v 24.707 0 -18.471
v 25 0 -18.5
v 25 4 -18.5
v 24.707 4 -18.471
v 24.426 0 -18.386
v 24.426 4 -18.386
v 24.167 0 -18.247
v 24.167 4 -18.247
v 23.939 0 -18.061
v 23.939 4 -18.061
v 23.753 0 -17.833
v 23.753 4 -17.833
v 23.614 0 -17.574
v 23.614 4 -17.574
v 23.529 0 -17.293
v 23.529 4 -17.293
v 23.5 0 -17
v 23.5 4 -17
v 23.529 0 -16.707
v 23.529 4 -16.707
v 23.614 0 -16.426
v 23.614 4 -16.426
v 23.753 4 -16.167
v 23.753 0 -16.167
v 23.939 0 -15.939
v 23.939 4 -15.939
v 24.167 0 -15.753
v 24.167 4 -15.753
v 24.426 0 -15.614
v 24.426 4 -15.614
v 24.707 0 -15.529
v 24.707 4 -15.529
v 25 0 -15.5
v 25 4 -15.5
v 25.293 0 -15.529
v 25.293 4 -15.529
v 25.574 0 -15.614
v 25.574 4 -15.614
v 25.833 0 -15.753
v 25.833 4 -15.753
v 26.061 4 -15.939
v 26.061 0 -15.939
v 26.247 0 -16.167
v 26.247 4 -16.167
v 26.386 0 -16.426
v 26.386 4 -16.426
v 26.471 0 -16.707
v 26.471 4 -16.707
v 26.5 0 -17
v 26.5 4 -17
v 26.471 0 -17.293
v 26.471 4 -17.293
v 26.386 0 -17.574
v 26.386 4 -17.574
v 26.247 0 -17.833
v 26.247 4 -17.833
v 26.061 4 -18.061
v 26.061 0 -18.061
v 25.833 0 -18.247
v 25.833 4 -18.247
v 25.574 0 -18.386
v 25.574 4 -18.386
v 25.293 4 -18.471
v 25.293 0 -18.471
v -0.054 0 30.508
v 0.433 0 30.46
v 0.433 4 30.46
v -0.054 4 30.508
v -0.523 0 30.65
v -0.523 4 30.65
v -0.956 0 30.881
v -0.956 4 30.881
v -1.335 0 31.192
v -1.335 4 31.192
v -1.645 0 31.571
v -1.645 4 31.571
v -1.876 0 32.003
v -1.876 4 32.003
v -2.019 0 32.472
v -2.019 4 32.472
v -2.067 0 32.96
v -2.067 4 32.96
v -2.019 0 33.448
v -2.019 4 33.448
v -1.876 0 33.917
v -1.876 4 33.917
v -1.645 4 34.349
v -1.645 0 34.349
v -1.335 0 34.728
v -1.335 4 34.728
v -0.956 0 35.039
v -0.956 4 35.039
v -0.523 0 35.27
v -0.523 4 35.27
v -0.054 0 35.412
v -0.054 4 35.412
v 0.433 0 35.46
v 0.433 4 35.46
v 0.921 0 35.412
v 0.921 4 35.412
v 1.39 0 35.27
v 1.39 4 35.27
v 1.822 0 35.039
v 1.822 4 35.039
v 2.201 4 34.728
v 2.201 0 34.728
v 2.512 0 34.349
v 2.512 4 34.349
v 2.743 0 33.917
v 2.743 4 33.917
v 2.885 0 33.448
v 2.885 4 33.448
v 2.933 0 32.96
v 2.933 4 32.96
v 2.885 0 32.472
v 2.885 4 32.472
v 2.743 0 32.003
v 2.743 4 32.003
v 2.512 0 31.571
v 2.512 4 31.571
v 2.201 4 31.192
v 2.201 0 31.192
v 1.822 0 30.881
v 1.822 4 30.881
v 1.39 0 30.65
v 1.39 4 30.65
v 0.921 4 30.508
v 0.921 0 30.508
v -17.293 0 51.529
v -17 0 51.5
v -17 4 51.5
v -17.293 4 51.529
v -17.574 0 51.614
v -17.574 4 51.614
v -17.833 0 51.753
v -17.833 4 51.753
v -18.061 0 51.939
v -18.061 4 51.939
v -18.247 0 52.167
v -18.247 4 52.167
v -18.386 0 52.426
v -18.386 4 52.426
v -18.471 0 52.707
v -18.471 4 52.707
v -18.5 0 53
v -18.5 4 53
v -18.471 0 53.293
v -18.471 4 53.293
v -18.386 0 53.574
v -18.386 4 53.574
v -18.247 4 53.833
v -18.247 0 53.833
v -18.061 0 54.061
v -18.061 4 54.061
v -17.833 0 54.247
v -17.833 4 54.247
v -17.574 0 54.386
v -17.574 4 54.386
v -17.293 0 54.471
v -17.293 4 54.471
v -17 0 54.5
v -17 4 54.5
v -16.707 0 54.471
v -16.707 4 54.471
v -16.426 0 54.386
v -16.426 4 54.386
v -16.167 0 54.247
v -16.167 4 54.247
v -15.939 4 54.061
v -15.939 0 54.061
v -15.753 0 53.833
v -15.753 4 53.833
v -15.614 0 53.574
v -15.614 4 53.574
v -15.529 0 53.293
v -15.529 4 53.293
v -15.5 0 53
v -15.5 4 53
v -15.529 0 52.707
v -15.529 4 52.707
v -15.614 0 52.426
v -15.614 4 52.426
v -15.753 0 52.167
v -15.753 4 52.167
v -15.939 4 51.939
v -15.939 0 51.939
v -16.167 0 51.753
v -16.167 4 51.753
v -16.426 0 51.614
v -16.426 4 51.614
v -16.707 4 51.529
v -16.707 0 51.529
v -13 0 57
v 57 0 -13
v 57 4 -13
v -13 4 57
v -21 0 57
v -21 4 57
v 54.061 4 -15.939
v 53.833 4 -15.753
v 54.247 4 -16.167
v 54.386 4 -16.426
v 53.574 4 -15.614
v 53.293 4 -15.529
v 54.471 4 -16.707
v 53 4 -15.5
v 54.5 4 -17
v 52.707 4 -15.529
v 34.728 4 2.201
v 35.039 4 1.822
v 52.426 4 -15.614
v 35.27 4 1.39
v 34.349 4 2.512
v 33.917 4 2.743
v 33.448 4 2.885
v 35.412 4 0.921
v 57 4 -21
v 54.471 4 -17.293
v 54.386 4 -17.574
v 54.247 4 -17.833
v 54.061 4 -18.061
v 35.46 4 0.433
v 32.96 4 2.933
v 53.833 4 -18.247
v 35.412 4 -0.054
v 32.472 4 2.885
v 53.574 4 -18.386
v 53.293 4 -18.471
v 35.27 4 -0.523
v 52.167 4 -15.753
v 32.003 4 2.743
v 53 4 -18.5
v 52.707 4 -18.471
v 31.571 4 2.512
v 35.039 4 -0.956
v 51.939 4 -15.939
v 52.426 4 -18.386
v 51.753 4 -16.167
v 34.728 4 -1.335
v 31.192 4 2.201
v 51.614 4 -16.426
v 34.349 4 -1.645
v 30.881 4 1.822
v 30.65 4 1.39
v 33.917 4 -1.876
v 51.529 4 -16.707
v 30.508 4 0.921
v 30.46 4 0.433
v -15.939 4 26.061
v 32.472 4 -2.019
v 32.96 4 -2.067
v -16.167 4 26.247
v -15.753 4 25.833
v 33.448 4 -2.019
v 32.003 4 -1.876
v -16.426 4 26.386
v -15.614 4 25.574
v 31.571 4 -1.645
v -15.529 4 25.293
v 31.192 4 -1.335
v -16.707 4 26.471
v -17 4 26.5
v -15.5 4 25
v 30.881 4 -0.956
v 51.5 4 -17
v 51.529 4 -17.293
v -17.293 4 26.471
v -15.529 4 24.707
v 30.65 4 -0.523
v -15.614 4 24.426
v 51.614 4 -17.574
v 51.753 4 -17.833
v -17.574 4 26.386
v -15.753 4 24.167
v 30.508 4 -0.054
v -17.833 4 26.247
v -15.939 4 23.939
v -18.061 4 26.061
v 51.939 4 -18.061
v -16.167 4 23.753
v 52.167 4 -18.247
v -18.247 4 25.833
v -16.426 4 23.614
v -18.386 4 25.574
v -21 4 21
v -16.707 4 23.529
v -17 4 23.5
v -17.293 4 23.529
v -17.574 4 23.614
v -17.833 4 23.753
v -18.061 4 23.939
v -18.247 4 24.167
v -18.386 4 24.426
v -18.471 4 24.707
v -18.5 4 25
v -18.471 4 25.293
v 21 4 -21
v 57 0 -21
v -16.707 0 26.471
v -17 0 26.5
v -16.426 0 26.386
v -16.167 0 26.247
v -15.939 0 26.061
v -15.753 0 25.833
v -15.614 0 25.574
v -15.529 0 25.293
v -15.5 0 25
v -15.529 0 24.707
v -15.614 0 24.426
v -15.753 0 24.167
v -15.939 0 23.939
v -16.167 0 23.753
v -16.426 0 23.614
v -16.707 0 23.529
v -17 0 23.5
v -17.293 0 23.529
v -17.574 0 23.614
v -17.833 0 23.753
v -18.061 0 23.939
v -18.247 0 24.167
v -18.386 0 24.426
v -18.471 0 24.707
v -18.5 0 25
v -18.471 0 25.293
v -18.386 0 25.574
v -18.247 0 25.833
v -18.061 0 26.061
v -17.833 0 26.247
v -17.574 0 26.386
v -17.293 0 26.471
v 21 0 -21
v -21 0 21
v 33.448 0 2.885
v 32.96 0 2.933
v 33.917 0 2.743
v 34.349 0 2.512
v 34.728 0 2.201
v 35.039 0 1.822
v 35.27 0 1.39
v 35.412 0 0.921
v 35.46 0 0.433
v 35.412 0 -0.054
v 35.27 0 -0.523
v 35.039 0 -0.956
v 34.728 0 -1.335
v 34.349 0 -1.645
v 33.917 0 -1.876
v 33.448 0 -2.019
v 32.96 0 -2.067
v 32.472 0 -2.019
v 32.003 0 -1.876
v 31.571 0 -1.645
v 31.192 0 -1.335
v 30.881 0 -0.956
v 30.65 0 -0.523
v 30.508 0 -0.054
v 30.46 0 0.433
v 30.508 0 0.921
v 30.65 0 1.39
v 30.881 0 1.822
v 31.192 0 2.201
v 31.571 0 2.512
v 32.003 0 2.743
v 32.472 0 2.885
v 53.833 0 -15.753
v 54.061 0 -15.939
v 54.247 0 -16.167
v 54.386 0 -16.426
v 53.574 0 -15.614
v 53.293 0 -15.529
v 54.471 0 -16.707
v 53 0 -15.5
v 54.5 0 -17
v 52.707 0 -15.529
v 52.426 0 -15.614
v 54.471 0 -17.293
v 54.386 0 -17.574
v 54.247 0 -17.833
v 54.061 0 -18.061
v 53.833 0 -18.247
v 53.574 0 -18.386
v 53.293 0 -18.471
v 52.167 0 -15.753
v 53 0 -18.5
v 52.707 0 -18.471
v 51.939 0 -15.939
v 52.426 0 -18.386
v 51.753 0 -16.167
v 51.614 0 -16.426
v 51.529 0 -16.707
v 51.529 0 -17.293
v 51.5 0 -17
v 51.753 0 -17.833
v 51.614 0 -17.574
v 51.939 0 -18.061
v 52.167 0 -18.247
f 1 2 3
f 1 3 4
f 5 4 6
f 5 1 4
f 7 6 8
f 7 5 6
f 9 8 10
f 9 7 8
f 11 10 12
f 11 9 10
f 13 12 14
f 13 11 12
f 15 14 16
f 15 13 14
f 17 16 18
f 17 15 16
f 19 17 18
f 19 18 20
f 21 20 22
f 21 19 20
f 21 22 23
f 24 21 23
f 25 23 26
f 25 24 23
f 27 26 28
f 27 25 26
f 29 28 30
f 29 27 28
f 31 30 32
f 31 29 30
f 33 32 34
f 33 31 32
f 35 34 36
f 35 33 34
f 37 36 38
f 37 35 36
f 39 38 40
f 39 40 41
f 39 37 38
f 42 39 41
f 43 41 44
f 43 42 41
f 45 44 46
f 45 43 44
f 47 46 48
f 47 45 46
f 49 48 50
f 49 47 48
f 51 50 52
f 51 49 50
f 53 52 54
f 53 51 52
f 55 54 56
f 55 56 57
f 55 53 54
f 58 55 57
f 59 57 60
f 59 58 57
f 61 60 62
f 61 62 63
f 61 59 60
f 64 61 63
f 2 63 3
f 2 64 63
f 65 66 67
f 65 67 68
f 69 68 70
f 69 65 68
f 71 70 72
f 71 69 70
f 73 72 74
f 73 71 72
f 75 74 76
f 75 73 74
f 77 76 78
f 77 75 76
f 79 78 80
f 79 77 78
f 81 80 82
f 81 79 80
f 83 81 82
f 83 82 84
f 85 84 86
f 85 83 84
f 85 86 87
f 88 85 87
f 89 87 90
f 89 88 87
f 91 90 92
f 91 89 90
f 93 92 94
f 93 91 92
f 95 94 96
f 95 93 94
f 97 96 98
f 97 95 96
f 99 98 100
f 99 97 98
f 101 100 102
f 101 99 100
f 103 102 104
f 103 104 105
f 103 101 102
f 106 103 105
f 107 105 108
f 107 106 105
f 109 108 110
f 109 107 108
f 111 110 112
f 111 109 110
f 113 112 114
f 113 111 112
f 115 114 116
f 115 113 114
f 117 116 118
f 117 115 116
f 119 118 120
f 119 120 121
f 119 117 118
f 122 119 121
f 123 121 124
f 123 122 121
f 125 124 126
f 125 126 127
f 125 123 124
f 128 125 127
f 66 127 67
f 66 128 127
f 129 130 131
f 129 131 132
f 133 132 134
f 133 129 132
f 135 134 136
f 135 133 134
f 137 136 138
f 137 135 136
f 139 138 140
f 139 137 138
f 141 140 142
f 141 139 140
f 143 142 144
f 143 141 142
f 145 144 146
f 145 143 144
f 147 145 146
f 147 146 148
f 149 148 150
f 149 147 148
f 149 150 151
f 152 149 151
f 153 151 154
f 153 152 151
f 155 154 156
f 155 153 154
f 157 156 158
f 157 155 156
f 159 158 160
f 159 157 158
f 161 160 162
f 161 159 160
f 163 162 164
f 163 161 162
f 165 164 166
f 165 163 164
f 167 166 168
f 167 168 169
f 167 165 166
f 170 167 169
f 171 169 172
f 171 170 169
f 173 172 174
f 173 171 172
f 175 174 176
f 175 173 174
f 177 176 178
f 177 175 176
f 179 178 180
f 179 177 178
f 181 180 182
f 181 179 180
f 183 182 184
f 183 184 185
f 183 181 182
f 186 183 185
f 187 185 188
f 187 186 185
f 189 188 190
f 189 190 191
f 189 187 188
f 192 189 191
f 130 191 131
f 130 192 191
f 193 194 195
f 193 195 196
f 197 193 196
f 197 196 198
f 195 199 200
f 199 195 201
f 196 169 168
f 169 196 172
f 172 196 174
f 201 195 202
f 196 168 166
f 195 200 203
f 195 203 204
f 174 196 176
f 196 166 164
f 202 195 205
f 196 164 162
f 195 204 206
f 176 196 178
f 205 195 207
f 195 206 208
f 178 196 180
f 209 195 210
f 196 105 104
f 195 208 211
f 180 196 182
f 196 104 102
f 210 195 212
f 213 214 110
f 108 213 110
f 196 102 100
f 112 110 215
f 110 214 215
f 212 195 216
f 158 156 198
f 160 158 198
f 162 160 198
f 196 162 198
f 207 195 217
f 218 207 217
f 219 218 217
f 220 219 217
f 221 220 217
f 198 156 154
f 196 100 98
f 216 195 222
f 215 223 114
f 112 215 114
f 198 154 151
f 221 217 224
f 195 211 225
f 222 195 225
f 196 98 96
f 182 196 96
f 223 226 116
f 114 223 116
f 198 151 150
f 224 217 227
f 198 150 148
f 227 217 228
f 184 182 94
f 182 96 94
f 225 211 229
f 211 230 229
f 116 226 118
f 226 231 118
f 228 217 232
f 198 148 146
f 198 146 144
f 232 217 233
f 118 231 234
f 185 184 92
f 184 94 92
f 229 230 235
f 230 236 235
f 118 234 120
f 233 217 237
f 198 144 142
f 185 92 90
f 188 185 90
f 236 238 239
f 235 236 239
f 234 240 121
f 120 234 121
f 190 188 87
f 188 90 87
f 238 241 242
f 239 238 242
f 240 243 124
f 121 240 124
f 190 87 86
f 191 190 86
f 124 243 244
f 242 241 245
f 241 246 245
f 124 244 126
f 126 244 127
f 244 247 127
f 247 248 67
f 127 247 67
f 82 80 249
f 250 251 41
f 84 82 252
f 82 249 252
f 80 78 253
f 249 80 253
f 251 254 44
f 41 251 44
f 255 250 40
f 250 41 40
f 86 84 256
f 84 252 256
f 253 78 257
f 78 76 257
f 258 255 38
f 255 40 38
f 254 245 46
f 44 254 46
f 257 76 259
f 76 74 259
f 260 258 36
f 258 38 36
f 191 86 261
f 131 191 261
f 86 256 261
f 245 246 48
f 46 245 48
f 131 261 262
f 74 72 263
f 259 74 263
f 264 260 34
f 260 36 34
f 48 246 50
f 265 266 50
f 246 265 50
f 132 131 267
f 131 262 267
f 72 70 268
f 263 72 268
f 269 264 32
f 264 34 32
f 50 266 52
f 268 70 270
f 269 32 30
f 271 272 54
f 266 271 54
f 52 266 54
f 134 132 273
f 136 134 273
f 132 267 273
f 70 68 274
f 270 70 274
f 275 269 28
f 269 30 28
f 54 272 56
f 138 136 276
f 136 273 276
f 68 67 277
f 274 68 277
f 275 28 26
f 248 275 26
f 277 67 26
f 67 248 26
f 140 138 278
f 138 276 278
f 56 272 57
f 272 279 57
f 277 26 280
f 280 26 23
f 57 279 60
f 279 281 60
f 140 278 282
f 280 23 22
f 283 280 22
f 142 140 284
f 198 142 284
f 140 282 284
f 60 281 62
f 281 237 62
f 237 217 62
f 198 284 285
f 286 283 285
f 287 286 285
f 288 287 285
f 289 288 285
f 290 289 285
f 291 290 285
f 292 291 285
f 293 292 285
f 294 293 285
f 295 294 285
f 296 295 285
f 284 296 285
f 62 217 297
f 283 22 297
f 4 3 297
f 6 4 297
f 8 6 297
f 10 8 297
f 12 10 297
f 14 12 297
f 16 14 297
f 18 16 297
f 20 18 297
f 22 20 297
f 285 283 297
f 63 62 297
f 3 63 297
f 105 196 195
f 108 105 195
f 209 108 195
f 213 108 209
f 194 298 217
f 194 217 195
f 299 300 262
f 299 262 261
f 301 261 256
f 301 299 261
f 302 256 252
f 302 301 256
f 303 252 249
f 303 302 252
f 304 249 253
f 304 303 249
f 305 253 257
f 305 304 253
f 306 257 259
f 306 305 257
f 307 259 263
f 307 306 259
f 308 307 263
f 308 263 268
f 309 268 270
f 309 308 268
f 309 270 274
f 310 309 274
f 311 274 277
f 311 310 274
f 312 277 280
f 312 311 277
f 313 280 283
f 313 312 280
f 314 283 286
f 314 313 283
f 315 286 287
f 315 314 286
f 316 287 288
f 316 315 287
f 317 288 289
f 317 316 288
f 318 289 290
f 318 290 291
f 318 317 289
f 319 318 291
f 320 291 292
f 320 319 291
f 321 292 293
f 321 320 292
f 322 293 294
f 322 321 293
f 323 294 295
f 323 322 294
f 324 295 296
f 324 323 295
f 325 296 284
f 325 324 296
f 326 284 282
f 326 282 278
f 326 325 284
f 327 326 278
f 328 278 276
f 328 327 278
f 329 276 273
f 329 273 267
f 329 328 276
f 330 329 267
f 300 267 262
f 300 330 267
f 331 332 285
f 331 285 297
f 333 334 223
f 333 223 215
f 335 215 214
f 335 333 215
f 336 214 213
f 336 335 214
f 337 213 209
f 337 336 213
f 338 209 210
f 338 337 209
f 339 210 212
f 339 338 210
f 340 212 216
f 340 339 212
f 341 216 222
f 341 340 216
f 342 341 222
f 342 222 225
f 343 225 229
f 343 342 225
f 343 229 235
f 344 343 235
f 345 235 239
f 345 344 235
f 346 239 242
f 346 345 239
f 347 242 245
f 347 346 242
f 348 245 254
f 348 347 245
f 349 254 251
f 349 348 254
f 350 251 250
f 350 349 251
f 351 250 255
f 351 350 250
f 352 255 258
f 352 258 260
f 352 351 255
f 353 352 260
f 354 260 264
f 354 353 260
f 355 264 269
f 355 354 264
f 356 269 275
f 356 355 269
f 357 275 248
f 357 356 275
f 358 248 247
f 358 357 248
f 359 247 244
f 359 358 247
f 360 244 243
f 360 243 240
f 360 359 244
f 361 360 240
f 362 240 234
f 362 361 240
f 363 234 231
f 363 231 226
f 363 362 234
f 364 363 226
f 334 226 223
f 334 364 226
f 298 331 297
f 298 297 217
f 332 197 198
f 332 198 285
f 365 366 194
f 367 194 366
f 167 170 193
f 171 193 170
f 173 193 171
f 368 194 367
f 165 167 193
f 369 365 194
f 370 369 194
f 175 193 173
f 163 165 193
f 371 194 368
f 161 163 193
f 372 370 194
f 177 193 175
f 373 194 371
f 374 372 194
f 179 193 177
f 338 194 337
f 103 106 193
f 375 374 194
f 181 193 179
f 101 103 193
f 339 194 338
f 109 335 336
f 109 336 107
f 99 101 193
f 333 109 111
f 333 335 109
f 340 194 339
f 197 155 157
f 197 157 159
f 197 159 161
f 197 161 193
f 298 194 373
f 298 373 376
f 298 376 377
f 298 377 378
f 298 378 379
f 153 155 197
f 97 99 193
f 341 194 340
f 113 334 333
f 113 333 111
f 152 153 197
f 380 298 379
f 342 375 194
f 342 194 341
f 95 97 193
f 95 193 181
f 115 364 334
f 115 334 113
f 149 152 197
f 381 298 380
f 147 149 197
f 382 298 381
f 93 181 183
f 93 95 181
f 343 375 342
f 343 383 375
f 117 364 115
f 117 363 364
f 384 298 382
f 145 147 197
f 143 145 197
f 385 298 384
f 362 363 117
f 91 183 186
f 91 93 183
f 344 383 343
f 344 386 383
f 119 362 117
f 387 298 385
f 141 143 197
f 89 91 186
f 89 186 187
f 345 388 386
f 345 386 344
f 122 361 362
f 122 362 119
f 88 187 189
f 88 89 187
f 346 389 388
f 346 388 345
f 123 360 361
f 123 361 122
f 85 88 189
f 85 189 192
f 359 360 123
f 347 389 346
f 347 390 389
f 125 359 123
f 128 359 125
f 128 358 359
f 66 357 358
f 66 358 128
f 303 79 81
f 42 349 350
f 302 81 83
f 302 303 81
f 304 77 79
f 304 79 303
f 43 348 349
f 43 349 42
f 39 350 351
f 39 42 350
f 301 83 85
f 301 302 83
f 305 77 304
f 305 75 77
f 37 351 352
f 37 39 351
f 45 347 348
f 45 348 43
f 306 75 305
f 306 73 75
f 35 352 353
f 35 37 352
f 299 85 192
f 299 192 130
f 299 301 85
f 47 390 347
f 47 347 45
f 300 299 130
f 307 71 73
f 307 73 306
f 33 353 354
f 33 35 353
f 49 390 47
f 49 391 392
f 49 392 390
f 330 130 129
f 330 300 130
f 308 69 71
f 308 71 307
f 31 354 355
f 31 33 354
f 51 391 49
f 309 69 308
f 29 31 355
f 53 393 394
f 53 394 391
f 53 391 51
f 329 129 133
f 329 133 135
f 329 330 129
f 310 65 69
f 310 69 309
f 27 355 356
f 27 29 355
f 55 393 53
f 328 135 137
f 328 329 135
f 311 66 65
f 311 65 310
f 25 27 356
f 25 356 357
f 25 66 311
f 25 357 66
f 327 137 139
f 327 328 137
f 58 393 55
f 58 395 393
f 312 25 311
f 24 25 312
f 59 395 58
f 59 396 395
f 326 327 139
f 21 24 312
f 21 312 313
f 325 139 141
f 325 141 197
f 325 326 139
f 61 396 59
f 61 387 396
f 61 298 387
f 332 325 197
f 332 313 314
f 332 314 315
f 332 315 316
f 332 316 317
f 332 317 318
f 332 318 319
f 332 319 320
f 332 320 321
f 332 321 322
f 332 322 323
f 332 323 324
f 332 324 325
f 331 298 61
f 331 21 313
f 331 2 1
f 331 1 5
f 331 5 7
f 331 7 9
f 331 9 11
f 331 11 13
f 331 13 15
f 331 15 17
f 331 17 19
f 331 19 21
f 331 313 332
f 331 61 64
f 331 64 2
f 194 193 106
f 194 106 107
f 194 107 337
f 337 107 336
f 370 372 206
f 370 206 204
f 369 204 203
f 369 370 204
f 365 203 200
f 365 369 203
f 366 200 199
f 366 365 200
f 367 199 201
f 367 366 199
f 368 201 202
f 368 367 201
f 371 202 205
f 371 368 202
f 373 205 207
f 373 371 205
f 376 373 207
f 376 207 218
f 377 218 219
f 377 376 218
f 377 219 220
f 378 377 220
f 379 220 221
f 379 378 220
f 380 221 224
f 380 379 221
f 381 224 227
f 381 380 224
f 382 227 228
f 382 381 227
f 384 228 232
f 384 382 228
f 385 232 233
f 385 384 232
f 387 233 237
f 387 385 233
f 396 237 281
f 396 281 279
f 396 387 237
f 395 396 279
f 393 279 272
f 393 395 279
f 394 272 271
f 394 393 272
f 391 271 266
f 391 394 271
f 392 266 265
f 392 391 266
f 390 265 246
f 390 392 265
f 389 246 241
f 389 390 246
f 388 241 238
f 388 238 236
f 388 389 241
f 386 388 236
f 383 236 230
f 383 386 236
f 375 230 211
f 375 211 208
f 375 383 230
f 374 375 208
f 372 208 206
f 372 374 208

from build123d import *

# Parameters (mm, degrees)
SKETCH_1_R      = 1.5
SKETCH_1_R_2    = 2.5
EXTRUDE_1_DEPTH = 4


with BuildPart() as part:
    # 草图1 → 凸台-拉伸1 (new body)
    with BuildSketch(Plane(origin=(0, 0, 0), x_dir=(1, 0, 0), z_dir=(0, 1, 0))):
        Polygon((-21, -21), (21, 21), (57, 21), (57, 13), (-13, -57), (-21, -57), align=None)
        with Locations((53, 17)):
            Circle(SKETCH_1_R, mode=Mode.SUBTRACT)
        with Locations((25, 17)):
            Circle(SKETCH_1_R, mode=Mode.SUBTRACT)
        with Locations((-17, -53)):
            Circle(SKETCH_1_R, mode=Mode.SUBTRACT)
        with Locations((-17, -25)):
            Circle(SKETCH_1_R, mode=Mode.SUBTRACT)
        with Locations((32.960155108, -0.433243174)):
            Circle(SKETCH_1_R_2, mode=Mode.SUBTRACT)
        with Locations((0.433243174, -32.960155108)):
            Circle(SKETCH_1_R_2, mode=Mode.SUBTRACT)
    extrude(amount=EXTRUDE_1_DEPTH)


solid = part.part
